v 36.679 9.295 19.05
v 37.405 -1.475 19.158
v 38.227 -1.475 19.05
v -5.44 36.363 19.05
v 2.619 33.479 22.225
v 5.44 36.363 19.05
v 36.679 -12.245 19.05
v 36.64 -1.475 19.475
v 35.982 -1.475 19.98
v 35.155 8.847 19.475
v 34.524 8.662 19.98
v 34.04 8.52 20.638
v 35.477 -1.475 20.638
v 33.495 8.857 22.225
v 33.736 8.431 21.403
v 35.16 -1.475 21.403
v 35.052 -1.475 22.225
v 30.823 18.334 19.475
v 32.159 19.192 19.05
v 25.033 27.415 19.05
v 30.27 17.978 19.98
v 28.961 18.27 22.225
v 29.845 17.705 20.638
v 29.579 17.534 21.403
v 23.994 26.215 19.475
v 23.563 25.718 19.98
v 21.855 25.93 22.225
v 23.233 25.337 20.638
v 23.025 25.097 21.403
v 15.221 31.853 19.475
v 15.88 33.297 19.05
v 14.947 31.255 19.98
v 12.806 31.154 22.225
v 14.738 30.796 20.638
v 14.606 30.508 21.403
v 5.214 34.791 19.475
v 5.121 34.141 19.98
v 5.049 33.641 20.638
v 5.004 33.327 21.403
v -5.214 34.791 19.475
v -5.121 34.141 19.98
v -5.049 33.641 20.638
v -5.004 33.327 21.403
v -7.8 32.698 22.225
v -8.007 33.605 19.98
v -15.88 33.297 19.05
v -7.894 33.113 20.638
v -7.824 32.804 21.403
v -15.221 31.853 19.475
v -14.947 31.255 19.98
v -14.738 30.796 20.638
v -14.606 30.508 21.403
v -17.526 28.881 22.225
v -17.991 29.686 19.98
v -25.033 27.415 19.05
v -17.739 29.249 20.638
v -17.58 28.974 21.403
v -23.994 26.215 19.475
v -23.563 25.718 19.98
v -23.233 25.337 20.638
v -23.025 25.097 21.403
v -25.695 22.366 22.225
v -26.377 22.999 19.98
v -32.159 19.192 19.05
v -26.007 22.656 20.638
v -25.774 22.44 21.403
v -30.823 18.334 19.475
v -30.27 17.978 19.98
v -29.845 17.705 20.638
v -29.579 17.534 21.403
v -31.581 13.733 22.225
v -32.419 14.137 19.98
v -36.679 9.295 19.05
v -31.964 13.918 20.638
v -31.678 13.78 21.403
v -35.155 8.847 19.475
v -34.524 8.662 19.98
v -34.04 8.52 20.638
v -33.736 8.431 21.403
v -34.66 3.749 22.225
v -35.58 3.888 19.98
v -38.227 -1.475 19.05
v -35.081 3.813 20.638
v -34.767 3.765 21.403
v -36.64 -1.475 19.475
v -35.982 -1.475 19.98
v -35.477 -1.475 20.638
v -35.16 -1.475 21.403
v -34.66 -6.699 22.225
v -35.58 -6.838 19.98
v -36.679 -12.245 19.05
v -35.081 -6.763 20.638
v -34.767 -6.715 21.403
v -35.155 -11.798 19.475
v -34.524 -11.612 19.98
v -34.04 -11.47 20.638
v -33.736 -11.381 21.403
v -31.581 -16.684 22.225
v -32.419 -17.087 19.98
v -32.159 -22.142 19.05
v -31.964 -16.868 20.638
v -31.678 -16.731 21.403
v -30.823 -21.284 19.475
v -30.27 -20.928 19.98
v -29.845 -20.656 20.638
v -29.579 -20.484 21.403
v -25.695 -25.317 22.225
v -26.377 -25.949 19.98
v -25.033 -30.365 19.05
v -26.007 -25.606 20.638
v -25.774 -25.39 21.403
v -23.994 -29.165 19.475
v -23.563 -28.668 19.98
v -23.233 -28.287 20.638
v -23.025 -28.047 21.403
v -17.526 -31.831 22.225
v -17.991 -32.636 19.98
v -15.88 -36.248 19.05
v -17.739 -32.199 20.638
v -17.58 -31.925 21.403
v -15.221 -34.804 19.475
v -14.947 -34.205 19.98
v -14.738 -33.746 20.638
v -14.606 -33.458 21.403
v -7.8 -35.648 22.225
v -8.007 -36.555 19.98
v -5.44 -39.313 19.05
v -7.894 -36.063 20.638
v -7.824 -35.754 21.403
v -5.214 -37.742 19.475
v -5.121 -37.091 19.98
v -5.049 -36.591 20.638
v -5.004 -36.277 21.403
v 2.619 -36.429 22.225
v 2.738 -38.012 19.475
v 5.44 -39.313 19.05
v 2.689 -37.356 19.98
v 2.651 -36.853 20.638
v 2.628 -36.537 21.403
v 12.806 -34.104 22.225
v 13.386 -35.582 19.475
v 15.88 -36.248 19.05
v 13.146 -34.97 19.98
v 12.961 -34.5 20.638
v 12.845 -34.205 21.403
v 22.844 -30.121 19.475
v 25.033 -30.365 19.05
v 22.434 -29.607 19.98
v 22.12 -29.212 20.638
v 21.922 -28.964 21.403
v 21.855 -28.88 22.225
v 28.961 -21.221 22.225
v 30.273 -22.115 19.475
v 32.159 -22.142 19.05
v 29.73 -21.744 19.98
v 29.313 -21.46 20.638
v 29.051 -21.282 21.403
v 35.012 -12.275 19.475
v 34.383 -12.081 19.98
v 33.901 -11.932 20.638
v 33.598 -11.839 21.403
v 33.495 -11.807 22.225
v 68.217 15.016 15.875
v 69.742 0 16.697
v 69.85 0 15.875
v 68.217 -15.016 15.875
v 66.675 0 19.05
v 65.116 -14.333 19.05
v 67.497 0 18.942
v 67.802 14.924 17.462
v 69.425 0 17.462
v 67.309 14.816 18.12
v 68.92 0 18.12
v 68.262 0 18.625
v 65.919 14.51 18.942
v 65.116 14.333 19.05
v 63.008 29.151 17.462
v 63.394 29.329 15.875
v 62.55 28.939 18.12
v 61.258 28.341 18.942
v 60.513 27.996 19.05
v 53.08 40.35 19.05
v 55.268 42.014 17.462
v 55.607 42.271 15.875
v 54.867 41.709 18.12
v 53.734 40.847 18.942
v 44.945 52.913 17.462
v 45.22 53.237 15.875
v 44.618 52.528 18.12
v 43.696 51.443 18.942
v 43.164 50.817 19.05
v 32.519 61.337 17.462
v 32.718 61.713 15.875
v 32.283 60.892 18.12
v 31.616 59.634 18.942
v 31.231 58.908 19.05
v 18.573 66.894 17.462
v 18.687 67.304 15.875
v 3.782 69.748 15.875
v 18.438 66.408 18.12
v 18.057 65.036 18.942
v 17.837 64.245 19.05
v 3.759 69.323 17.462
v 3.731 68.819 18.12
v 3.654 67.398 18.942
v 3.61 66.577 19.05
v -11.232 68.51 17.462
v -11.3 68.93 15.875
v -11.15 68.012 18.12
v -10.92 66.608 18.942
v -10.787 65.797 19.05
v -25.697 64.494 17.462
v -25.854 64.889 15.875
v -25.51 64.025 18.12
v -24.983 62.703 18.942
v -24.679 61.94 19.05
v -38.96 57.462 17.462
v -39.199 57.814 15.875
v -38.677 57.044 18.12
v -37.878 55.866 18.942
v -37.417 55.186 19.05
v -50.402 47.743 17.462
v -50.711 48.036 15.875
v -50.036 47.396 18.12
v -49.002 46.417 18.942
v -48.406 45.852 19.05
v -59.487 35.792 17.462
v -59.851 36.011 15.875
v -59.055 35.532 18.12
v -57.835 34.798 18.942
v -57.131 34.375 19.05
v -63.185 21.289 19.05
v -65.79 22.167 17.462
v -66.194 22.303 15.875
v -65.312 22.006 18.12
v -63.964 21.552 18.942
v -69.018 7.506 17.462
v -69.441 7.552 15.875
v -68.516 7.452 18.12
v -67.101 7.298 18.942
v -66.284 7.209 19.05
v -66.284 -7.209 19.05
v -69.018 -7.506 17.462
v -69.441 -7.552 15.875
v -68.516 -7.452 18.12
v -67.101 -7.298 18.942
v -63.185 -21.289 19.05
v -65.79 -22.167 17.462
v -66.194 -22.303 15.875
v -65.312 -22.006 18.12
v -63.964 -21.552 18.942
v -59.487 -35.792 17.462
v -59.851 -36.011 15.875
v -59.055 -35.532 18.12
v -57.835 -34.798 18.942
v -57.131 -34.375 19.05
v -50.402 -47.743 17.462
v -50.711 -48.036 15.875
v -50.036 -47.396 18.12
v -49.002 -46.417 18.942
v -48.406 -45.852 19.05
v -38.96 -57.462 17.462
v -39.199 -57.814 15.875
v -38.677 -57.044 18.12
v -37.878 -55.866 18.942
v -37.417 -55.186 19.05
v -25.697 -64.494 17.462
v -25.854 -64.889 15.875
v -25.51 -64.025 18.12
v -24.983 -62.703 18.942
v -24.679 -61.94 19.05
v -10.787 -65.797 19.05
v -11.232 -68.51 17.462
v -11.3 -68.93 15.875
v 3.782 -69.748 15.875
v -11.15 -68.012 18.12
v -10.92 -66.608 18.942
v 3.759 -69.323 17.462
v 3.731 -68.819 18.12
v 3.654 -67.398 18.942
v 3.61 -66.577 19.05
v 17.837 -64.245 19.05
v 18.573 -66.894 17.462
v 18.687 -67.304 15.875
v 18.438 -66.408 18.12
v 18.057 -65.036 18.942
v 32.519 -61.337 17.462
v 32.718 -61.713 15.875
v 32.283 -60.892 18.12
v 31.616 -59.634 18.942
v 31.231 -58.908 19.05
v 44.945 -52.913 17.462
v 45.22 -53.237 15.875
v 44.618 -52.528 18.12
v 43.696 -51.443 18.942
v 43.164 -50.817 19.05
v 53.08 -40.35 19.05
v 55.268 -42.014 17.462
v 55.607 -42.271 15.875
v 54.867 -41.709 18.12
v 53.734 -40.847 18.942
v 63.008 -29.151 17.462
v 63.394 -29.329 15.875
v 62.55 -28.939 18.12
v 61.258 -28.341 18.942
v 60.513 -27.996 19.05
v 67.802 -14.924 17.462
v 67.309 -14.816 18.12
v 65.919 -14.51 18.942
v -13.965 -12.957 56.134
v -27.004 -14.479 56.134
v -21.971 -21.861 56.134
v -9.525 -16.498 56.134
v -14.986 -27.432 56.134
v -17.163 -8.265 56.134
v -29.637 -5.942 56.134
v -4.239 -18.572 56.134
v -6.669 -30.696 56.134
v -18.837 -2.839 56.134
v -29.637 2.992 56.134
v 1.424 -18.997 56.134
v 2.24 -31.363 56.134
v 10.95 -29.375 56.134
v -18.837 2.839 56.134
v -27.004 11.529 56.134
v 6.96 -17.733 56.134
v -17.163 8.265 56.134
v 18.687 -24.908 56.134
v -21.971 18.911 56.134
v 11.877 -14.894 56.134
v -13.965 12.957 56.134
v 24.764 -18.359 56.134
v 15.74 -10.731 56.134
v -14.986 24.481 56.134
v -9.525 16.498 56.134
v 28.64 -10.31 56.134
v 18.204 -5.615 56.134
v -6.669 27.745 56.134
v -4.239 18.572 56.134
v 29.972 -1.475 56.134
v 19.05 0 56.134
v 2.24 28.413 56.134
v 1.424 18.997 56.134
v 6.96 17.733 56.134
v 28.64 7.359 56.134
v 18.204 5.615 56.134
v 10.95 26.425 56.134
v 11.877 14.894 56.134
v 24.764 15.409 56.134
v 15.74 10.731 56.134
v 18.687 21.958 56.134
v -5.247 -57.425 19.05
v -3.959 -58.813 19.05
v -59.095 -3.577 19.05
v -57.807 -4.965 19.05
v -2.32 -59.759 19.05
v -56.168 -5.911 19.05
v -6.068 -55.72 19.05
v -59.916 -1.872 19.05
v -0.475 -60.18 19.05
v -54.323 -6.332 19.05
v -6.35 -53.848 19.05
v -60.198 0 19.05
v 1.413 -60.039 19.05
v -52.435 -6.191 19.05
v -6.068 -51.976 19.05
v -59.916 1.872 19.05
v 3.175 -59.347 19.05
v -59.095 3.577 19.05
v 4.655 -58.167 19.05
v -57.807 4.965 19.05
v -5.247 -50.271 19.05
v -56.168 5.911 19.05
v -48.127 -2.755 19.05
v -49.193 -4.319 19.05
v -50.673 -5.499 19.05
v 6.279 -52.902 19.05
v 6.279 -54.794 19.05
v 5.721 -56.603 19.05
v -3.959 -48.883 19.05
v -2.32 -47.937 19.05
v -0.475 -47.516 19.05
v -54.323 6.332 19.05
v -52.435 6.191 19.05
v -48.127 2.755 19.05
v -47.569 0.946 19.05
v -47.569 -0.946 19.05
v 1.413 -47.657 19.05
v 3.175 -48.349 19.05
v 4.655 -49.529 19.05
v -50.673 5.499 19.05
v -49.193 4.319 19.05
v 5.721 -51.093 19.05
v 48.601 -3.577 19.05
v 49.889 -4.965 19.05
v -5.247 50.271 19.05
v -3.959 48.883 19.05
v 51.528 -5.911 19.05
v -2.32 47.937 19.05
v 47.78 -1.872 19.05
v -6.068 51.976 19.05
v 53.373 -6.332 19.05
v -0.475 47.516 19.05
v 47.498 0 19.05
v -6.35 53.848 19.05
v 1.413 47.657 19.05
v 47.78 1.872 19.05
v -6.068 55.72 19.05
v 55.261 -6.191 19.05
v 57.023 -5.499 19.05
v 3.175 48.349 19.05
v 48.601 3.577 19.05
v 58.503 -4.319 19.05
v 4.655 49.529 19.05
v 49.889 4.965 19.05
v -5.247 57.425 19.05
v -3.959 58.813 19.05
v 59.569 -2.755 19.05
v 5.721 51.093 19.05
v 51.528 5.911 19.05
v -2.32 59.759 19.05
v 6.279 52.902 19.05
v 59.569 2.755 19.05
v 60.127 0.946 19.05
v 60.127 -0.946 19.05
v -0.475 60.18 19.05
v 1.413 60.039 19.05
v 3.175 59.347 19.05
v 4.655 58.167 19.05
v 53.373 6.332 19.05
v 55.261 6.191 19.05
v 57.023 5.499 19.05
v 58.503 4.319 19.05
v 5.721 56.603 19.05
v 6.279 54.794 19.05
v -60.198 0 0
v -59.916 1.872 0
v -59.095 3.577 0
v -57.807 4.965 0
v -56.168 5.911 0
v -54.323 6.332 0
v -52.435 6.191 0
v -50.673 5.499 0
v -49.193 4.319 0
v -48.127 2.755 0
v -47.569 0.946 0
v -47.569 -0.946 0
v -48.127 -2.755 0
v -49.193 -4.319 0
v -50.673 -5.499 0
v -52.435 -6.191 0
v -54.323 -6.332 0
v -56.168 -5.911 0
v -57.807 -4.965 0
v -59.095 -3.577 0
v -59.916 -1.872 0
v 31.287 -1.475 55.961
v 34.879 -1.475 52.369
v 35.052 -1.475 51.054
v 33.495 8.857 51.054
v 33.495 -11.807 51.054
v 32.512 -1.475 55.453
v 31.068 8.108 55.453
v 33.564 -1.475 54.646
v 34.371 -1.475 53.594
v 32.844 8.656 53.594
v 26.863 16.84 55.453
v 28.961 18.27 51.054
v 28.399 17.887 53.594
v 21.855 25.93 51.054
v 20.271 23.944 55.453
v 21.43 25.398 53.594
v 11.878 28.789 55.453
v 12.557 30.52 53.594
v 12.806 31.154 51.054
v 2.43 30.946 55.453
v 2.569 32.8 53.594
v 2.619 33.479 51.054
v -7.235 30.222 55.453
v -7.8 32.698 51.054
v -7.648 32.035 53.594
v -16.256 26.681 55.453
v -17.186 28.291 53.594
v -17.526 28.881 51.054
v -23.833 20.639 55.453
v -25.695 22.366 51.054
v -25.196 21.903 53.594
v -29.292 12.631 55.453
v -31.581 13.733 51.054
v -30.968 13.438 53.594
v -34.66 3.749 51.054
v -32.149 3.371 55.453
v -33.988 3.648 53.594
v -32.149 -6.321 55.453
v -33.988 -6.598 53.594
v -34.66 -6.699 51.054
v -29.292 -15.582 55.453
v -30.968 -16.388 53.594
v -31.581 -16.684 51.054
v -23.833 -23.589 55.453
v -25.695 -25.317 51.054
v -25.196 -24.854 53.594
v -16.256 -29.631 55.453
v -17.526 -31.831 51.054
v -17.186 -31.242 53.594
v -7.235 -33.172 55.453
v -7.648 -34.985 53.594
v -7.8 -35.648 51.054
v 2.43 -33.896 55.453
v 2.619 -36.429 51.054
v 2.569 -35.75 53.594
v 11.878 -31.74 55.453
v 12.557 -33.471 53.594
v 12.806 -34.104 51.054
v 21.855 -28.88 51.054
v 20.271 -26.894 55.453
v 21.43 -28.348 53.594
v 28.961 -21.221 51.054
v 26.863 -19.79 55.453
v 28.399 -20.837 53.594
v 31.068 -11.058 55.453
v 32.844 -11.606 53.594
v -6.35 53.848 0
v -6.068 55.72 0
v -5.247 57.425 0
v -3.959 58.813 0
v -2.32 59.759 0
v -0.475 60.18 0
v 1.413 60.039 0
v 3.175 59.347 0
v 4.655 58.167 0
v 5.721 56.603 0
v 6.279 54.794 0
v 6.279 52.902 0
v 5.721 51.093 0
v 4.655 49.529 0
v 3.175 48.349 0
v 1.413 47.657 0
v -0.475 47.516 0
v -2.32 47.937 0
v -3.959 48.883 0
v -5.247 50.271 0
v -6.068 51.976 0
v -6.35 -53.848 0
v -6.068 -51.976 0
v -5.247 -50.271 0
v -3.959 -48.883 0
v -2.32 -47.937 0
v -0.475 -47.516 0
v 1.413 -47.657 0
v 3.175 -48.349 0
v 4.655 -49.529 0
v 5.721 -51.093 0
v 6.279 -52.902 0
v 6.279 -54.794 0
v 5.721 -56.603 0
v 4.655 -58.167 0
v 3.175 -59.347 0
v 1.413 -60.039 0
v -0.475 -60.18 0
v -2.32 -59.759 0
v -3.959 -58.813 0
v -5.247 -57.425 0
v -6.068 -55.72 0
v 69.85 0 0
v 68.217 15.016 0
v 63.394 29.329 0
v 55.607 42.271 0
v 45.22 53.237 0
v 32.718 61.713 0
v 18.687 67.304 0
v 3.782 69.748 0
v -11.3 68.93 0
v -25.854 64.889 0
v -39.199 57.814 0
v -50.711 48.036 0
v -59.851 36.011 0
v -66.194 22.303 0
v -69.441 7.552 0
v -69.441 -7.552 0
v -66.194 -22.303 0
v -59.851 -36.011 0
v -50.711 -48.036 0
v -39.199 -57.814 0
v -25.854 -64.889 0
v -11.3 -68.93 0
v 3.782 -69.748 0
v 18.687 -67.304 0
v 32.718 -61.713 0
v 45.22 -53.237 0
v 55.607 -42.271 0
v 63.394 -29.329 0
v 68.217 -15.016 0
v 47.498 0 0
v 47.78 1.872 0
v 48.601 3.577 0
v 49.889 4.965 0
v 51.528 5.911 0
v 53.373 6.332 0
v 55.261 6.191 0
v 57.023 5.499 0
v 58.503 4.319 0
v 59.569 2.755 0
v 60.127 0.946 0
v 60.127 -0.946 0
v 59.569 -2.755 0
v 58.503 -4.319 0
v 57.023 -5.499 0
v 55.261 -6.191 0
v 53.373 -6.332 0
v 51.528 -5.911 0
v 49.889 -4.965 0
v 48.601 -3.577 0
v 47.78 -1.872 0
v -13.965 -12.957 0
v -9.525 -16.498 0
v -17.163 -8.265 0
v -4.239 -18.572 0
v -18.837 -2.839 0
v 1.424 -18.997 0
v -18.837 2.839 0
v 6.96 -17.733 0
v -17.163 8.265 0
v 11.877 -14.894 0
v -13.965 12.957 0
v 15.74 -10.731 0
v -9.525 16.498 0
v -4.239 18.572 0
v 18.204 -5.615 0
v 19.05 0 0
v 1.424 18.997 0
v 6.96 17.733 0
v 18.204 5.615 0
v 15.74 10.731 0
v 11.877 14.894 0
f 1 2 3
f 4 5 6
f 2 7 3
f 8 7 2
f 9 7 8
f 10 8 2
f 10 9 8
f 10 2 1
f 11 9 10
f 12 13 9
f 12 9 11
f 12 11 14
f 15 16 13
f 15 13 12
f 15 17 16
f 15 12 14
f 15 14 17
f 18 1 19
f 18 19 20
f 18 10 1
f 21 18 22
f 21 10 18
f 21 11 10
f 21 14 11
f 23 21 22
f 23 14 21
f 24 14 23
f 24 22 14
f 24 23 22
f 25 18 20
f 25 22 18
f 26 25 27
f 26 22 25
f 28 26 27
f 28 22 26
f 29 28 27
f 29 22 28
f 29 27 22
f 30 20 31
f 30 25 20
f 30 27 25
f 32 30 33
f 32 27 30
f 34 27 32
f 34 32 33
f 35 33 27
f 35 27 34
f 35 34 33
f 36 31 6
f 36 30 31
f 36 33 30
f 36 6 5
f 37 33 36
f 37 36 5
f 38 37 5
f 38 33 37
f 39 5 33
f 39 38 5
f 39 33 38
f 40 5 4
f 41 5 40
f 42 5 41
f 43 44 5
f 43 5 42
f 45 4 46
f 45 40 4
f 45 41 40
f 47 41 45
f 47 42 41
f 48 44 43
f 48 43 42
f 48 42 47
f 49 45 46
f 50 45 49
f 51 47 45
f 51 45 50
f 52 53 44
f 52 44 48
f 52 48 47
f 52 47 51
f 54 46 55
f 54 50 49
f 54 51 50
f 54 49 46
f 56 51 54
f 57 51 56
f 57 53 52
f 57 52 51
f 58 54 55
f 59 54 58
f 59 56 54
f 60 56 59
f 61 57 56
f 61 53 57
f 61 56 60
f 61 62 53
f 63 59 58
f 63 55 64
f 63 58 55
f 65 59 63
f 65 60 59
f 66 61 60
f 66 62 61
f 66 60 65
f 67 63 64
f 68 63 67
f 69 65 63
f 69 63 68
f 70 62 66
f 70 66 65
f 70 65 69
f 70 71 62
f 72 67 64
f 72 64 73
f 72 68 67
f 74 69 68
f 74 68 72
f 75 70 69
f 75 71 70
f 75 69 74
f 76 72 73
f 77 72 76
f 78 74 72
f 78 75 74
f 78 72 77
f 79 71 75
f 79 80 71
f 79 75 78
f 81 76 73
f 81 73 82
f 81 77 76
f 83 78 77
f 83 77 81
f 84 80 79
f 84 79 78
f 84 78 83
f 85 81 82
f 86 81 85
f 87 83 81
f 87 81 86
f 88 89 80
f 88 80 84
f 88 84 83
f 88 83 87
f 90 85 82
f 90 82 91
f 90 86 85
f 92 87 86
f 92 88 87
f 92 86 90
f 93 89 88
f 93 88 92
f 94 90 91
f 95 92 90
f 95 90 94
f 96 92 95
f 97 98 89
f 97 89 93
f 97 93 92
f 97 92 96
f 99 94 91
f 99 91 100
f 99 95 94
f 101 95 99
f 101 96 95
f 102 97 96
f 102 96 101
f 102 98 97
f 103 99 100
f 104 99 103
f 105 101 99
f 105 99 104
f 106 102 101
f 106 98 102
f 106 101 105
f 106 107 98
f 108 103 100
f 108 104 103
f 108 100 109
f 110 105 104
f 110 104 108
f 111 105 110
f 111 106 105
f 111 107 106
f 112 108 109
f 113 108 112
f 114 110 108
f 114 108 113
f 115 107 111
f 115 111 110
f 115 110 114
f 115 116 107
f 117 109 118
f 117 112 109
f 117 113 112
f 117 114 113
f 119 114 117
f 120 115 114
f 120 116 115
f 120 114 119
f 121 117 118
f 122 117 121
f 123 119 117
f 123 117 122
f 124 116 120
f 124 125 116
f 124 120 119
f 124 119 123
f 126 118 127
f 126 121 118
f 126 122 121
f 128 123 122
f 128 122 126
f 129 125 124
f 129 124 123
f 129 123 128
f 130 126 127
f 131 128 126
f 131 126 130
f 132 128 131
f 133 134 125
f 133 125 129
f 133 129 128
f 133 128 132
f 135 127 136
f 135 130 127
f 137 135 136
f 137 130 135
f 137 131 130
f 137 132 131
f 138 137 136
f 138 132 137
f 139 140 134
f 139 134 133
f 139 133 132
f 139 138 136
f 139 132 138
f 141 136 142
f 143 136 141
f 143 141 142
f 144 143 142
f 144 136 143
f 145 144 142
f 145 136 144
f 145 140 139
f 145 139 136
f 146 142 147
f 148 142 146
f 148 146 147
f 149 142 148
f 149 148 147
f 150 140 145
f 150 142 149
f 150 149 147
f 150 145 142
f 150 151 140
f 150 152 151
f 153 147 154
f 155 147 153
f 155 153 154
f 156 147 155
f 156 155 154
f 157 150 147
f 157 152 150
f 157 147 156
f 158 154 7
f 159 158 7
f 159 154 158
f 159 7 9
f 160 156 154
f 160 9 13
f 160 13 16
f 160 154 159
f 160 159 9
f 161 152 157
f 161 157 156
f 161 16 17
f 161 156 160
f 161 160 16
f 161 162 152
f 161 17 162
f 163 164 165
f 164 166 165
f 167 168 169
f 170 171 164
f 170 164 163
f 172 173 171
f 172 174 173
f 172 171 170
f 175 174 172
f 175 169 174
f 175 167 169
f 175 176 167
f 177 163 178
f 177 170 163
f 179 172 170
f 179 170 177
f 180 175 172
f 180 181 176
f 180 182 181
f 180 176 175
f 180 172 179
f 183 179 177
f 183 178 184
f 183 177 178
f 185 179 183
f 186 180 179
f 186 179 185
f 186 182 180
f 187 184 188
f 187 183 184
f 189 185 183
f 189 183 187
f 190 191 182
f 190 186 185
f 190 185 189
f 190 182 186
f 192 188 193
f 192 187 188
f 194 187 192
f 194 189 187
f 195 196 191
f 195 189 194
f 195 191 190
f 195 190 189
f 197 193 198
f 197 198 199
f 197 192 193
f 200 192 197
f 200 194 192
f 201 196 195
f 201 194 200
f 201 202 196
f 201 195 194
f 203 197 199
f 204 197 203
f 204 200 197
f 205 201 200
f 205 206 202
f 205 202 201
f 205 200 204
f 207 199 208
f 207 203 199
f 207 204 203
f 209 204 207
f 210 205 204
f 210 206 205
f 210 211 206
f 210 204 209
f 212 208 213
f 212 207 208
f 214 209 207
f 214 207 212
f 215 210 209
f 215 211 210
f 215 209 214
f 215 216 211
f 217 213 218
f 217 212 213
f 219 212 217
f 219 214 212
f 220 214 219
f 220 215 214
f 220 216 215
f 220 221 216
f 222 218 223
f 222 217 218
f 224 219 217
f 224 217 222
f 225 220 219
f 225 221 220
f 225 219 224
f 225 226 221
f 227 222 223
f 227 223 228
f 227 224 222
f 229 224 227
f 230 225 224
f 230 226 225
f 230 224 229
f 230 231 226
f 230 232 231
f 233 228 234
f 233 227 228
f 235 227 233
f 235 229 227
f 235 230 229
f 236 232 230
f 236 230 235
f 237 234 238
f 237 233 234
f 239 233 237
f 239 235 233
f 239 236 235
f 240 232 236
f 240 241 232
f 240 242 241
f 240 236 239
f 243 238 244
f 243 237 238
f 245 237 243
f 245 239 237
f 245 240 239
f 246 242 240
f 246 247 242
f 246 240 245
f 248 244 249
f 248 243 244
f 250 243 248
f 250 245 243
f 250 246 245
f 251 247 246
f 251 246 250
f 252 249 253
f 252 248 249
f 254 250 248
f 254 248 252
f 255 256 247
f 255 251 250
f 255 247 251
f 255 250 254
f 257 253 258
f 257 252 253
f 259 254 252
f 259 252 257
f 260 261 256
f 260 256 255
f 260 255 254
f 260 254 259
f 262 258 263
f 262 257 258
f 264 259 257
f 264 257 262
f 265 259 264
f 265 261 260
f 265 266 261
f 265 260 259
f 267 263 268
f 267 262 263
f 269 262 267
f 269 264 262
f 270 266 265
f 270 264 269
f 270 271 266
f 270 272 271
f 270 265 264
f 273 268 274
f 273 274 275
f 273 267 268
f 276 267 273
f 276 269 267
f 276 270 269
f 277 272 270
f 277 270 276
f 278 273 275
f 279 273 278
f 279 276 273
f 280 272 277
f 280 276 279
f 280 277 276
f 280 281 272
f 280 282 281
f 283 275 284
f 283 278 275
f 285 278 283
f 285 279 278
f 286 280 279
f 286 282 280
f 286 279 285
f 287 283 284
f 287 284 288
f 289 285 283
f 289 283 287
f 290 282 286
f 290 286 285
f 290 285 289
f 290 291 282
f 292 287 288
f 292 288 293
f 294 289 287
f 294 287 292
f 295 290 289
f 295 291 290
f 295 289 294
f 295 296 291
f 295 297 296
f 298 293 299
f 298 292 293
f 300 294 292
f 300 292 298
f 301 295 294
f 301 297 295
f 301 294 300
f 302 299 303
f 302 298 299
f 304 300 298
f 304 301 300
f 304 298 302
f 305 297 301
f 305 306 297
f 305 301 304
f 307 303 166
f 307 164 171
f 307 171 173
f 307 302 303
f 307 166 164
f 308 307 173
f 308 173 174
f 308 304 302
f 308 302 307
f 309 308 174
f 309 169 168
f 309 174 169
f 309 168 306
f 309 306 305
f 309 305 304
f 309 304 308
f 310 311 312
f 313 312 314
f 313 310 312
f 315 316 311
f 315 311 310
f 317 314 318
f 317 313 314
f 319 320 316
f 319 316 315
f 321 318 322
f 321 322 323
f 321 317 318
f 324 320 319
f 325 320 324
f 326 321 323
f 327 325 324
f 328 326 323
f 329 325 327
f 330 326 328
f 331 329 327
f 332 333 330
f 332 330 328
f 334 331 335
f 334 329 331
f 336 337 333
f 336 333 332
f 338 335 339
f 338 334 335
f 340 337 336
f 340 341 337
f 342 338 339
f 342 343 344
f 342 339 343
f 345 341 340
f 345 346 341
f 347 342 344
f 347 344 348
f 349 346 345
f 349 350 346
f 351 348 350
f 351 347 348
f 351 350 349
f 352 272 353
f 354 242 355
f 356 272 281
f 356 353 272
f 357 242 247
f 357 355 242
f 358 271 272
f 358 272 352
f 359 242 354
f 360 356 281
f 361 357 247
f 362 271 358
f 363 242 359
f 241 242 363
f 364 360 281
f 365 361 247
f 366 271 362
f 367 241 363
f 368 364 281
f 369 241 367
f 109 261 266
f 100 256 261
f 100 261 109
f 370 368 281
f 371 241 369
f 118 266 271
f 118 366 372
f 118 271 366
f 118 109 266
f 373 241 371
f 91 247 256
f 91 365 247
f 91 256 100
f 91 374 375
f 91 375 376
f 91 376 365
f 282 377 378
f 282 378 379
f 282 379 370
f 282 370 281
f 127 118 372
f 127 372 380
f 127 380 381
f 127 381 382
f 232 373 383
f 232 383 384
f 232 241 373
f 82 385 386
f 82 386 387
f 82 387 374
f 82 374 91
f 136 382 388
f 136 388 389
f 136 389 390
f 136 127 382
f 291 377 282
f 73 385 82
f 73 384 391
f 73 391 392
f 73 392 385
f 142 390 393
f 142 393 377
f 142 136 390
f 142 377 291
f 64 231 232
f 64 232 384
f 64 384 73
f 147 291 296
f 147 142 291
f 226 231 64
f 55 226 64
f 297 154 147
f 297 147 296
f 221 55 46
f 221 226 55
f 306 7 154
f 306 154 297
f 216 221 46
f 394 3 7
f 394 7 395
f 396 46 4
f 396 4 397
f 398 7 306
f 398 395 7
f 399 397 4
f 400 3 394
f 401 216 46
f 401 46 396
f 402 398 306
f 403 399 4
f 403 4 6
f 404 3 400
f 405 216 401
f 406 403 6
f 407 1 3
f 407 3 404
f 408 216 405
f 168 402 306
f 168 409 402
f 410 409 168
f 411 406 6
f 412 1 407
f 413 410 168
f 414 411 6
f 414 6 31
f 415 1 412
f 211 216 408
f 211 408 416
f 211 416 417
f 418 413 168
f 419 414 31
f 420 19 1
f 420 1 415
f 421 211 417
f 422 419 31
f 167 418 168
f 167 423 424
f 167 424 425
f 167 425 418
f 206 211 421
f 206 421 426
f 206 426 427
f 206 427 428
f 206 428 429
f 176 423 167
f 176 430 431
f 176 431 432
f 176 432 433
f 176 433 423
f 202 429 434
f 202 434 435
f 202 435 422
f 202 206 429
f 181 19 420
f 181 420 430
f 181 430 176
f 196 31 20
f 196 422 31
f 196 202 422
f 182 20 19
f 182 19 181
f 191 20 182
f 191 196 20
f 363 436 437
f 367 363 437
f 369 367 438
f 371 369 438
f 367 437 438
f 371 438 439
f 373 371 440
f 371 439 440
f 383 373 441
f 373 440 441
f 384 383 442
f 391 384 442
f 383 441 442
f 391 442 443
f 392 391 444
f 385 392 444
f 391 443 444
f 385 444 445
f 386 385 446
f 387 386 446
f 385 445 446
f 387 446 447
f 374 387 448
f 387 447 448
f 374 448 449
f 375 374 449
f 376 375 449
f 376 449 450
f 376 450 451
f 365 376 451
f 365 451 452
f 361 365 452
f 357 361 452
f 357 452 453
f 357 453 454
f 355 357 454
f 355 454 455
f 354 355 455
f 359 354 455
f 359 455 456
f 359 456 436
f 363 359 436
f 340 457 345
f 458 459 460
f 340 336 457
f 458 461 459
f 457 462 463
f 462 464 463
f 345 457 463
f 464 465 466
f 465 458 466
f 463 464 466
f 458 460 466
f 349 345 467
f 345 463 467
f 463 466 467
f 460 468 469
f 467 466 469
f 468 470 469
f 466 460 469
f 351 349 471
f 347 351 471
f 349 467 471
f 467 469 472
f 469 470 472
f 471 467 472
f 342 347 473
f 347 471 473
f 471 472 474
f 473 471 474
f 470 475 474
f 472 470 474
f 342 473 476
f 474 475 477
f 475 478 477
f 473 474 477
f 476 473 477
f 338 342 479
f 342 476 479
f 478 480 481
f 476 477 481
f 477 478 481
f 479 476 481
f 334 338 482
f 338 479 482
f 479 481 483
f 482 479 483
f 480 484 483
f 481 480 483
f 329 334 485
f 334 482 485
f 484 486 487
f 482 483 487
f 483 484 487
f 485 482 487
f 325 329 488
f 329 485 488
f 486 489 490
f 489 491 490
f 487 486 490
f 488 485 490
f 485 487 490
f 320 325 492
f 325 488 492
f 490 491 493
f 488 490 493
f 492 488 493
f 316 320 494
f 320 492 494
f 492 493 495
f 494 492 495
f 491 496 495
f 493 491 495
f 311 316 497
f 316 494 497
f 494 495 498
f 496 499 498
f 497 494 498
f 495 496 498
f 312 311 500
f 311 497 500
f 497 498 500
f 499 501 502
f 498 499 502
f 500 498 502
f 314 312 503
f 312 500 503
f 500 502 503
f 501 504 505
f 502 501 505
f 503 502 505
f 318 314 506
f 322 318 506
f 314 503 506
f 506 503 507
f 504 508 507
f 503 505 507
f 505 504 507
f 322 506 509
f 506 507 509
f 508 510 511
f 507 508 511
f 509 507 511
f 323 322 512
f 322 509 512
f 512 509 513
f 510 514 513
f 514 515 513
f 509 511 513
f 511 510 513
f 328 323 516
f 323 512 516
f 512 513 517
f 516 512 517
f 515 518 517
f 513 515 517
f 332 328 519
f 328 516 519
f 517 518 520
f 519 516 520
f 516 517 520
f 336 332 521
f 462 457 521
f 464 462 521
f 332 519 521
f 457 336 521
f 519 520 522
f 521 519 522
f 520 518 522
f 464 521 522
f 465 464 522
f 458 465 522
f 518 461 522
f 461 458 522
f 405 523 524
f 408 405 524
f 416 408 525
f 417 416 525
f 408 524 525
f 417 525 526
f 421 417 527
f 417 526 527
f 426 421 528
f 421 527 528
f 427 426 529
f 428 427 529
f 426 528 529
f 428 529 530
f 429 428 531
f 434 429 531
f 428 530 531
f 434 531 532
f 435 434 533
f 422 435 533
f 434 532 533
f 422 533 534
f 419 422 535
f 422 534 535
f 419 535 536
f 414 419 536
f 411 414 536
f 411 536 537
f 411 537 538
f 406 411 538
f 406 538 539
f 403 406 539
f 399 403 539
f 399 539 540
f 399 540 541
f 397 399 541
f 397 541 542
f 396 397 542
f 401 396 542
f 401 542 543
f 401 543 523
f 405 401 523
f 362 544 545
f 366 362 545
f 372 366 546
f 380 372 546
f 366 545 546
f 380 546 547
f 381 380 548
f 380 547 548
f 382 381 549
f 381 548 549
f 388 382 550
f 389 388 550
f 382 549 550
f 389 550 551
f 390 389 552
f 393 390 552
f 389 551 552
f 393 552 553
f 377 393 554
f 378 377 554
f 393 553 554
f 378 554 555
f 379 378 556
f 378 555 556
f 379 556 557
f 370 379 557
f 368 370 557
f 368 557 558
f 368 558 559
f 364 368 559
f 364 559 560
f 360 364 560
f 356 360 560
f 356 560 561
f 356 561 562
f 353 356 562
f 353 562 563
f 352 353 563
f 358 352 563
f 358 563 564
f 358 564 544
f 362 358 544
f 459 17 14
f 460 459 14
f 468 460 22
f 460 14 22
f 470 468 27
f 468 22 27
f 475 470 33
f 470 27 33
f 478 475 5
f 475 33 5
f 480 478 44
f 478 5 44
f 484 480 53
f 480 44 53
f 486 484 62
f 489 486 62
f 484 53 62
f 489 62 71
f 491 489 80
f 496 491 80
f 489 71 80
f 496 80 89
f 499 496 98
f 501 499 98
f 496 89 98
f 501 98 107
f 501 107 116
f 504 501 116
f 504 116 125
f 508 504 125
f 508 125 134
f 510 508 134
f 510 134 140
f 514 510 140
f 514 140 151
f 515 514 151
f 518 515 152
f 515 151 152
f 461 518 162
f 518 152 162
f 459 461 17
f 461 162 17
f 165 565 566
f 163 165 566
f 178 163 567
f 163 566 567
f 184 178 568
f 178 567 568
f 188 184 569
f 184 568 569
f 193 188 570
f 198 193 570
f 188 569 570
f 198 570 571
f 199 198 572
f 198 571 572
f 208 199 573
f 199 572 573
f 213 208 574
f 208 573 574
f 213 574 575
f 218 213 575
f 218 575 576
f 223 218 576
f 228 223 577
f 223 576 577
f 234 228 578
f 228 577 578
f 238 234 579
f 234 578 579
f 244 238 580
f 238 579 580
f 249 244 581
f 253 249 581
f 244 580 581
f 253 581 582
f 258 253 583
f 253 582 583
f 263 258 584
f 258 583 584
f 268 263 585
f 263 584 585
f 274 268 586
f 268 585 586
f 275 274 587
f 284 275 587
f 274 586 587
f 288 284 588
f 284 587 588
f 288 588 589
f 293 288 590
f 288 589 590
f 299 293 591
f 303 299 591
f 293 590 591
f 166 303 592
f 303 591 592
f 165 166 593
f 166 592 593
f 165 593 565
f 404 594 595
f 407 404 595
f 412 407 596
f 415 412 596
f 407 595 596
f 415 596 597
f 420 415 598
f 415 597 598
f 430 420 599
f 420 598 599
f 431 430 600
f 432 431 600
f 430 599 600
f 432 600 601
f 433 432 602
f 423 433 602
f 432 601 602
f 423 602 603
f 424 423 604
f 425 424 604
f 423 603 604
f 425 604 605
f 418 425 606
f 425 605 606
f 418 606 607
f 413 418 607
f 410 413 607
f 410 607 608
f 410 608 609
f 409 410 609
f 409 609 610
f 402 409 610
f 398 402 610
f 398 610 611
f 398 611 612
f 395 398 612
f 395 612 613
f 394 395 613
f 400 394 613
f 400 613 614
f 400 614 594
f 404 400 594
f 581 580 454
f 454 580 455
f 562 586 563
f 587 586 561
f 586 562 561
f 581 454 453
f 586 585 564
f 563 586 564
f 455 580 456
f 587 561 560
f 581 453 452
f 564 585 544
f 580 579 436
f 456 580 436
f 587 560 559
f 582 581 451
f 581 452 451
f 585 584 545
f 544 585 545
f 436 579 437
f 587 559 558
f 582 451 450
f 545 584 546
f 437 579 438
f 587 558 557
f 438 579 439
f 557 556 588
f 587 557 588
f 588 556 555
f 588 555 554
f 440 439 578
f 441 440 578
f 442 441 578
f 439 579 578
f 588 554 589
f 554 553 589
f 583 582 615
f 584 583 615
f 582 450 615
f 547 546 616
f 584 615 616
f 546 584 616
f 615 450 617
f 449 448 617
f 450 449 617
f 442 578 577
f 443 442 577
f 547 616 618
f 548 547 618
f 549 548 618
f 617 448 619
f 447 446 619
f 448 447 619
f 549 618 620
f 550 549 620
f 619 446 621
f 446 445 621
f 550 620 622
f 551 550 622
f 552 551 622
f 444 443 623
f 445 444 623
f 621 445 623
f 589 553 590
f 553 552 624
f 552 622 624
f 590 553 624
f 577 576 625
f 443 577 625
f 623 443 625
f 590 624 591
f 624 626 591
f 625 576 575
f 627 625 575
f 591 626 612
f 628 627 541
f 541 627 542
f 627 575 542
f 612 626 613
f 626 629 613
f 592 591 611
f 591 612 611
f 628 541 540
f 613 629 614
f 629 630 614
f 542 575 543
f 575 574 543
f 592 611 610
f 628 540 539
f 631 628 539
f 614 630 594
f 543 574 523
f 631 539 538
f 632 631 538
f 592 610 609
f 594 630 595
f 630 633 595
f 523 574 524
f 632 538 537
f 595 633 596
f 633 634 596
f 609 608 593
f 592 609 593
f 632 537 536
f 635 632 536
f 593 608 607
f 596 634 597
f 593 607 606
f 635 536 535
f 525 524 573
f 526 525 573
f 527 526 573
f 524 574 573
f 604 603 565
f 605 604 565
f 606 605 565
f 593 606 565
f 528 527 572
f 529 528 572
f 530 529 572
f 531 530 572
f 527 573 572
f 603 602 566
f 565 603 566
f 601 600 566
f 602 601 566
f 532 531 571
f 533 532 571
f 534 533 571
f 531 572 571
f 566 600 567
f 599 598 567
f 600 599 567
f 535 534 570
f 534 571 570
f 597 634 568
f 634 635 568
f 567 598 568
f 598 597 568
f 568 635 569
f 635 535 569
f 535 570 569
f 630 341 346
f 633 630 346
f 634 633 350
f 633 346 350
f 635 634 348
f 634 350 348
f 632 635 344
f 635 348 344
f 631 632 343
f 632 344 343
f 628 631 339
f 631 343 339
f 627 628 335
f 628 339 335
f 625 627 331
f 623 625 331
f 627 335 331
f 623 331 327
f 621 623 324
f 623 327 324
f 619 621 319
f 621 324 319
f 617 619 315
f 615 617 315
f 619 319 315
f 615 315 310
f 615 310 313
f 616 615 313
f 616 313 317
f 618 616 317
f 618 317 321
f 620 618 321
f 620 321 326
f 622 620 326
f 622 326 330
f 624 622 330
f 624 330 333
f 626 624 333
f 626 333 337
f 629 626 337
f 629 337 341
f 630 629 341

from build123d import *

# Parameters (mm, degrees)
F0_R     = 69.85
F1_DEPTH = 19.05
F2_R     = 35.052
F3_DEPTH = 37.084
F4_R     = 19.05
F5_DEPTH = 56.135
F7_D     = 12.7
F8_R     = 3.175
F9_R     = 5.08


with BuildPart() as f1:
    # F0 (on Top) → F1 (new body)
    with BuildSketch(Plane.XY):
        Circle(F0_R)
    extrude(amount=F1_DEPTH)

    # F2 (on face) → F3 (join)
    with BuildSketch(Plane.XY.offset(19.05)):
        with Locations((0, -1.475124)):
            Circle(F2_R)
    extrude(amount=F3_DEPTH)

    # F4 (on face) → F5 (cut, through all)
    with BuildSketch(Plane.XY.offset(56.134)):
        Circle(F4_R)
    extrude(amount=-F5_DEPTH, mode=Mode.SUBTRACT)

    # F7 (through all)
    with Locations(Plane.XY.offset(19.05)):
        with Locations((0, 53.848), (53.848, 0), (0, -53.848), (-53.848, 0)):
            Hole(F7_D / 2)

    # F8
    f8_edges = [f1.edges().sort_by_distance(p)[0] for p in [
        (-69.85, 0, 19.05),
        (-35.052, -1.475124, 19.05),
    ]]
    fillet(f8_edges, radius=F8_R)

    # F9
    f9_edges = [f1.edges().sort_by_distance(p)[0] for p in [
        (-35.052, -1.475124, 56.134),
    ]]
    fillet(f9_edges, radius=F9_R)


solid = f1.part
